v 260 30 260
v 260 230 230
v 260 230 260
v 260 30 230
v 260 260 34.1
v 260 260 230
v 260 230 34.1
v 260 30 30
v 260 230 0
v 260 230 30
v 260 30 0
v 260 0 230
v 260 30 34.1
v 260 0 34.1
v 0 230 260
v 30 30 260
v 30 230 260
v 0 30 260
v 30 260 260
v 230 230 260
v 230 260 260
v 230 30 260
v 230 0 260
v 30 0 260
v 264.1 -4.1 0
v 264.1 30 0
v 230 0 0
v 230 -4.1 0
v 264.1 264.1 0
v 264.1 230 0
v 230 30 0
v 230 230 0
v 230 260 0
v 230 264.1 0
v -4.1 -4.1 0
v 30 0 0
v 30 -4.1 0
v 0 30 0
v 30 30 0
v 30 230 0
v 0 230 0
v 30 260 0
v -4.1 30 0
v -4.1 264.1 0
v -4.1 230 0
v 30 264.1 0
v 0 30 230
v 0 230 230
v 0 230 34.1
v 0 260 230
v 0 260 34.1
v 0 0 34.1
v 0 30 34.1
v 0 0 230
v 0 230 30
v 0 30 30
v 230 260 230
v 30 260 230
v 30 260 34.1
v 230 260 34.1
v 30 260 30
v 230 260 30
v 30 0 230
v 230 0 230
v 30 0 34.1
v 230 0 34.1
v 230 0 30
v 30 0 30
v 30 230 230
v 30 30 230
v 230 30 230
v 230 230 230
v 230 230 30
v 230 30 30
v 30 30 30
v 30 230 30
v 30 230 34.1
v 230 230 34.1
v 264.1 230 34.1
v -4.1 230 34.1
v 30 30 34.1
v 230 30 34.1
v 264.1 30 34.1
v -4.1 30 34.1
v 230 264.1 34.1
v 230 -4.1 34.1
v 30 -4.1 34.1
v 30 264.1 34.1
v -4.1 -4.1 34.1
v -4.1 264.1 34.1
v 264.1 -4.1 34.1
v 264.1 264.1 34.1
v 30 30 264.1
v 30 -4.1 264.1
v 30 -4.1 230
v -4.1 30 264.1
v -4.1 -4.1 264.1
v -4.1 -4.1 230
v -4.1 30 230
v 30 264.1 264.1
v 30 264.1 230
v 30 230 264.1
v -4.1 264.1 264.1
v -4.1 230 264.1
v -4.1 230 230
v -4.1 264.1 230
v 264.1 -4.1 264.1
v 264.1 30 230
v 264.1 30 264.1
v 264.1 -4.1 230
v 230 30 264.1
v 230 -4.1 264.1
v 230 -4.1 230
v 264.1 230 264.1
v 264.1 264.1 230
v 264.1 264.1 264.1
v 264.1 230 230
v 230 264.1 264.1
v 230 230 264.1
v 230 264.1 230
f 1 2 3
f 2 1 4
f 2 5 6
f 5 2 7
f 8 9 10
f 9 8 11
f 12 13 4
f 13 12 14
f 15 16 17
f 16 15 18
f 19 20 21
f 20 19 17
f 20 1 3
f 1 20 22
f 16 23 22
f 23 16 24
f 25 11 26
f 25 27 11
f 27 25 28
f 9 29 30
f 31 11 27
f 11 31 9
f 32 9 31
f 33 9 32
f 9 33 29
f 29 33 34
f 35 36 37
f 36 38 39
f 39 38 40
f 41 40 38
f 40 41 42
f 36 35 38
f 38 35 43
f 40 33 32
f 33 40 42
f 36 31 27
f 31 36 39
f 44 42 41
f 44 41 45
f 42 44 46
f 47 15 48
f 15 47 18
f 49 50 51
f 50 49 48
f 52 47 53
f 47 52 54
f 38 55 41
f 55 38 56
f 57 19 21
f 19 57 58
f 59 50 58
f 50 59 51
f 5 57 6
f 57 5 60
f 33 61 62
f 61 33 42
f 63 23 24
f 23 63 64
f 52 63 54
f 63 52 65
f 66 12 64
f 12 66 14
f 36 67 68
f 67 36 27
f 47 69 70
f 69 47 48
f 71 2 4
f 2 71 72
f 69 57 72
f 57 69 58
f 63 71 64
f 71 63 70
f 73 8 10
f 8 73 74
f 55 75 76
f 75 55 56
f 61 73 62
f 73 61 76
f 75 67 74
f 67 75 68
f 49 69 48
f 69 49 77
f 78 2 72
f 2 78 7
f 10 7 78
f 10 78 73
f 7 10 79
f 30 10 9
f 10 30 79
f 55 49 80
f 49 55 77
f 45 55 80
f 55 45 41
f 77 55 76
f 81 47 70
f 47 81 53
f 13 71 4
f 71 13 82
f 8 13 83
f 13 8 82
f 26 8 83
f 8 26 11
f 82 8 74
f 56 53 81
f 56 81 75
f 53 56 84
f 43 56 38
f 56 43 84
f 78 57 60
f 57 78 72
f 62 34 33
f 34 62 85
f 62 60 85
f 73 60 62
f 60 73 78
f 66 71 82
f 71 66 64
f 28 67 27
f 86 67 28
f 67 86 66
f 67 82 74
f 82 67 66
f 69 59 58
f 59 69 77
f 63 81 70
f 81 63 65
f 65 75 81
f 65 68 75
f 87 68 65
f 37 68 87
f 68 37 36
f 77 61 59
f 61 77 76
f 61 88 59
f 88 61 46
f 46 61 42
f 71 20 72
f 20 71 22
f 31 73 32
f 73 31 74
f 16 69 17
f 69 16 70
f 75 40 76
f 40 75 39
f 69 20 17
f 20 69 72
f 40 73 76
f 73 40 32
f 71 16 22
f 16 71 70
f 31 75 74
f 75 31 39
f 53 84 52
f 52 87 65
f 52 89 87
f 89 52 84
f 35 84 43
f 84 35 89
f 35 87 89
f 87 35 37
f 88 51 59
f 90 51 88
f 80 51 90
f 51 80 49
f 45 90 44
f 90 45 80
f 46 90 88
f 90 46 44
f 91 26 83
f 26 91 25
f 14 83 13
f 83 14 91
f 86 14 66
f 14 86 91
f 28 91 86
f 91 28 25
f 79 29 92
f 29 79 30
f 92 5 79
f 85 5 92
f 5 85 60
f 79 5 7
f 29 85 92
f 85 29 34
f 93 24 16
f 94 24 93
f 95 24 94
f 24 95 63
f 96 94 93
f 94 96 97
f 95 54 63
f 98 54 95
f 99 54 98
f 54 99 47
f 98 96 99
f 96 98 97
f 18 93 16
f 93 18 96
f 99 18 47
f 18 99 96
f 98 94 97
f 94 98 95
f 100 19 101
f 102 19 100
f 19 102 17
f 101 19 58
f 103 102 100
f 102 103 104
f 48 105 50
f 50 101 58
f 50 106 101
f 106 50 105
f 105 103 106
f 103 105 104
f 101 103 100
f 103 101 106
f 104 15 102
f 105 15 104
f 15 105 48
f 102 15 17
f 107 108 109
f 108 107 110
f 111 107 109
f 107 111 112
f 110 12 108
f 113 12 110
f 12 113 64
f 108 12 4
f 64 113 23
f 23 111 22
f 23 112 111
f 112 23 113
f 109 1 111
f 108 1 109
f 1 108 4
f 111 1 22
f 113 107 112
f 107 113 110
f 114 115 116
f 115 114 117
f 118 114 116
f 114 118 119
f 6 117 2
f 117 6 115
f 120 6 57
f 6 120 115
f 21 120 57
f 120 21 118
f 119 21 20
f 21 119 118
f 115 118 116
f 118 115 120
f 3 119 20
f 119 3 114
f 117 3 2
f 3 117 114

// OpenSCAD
corner_extra_width = 4.1;
stick_height = 200;
corner_cube_height = 30;

difference(){
    cube(stick_height + 2*corner_cube_height);
    translate([0,corner_cube_height,corner_cube_height]){
        cube([stick_height+2*corner_cube_height,stick_height,stick_height]);
    }
    translate([corner_cube_height,0,corner_cube_height]){
        cube([stick_height,stick_height+2*corner_cube_height,stick_height]);
    }
    translate([corner_cube_height,corner_cube_height,0]){
        cube([stick_height,stick_height,stick_height+2*corner_cube_height]);
    }
}
translate([-corner_extra_width,-corner_extra_width,0]){
    cube(corner_cube_height+corner_extra_width);
}
translate([-corner_extra_width,stick_height+corner_cube_height,0]){
    cube(corner_cube_height+corner_extra_width);
}
translate([stick_height+corner_cube_height,-corner_extra_width,0]){
    cube(corner_cube_height+corner_extra_width);
}
translate([stick_height+corner_cube_height,stick_height+corner_cube_height,0]){
    cube(corner_cube_height+corner_extra_width);
}
translate([-corner_extra_width,-corner_extra_width,stick_height+corner_cube_height]){
    cube(corner_cube_height+corner_extra_width);
}
translate([-corner_extra_width,stick_height+corner_cube_height,stick_height+corner_cube_height]){
    cube(corner_cube_height+corner_extra_width);
}
translate([stick_height+corner_cube_height,-corner_extra_width,stick_height+corner_cube_height]){
    cube(corner_cube_height+corner_extra_width);
}
translate([stick_height+corner_cube_height,stick_height+corner_cube_height,stick_height+corner_cube_height]){
    cube(corner_cube_height+corner_extra_width);
}
